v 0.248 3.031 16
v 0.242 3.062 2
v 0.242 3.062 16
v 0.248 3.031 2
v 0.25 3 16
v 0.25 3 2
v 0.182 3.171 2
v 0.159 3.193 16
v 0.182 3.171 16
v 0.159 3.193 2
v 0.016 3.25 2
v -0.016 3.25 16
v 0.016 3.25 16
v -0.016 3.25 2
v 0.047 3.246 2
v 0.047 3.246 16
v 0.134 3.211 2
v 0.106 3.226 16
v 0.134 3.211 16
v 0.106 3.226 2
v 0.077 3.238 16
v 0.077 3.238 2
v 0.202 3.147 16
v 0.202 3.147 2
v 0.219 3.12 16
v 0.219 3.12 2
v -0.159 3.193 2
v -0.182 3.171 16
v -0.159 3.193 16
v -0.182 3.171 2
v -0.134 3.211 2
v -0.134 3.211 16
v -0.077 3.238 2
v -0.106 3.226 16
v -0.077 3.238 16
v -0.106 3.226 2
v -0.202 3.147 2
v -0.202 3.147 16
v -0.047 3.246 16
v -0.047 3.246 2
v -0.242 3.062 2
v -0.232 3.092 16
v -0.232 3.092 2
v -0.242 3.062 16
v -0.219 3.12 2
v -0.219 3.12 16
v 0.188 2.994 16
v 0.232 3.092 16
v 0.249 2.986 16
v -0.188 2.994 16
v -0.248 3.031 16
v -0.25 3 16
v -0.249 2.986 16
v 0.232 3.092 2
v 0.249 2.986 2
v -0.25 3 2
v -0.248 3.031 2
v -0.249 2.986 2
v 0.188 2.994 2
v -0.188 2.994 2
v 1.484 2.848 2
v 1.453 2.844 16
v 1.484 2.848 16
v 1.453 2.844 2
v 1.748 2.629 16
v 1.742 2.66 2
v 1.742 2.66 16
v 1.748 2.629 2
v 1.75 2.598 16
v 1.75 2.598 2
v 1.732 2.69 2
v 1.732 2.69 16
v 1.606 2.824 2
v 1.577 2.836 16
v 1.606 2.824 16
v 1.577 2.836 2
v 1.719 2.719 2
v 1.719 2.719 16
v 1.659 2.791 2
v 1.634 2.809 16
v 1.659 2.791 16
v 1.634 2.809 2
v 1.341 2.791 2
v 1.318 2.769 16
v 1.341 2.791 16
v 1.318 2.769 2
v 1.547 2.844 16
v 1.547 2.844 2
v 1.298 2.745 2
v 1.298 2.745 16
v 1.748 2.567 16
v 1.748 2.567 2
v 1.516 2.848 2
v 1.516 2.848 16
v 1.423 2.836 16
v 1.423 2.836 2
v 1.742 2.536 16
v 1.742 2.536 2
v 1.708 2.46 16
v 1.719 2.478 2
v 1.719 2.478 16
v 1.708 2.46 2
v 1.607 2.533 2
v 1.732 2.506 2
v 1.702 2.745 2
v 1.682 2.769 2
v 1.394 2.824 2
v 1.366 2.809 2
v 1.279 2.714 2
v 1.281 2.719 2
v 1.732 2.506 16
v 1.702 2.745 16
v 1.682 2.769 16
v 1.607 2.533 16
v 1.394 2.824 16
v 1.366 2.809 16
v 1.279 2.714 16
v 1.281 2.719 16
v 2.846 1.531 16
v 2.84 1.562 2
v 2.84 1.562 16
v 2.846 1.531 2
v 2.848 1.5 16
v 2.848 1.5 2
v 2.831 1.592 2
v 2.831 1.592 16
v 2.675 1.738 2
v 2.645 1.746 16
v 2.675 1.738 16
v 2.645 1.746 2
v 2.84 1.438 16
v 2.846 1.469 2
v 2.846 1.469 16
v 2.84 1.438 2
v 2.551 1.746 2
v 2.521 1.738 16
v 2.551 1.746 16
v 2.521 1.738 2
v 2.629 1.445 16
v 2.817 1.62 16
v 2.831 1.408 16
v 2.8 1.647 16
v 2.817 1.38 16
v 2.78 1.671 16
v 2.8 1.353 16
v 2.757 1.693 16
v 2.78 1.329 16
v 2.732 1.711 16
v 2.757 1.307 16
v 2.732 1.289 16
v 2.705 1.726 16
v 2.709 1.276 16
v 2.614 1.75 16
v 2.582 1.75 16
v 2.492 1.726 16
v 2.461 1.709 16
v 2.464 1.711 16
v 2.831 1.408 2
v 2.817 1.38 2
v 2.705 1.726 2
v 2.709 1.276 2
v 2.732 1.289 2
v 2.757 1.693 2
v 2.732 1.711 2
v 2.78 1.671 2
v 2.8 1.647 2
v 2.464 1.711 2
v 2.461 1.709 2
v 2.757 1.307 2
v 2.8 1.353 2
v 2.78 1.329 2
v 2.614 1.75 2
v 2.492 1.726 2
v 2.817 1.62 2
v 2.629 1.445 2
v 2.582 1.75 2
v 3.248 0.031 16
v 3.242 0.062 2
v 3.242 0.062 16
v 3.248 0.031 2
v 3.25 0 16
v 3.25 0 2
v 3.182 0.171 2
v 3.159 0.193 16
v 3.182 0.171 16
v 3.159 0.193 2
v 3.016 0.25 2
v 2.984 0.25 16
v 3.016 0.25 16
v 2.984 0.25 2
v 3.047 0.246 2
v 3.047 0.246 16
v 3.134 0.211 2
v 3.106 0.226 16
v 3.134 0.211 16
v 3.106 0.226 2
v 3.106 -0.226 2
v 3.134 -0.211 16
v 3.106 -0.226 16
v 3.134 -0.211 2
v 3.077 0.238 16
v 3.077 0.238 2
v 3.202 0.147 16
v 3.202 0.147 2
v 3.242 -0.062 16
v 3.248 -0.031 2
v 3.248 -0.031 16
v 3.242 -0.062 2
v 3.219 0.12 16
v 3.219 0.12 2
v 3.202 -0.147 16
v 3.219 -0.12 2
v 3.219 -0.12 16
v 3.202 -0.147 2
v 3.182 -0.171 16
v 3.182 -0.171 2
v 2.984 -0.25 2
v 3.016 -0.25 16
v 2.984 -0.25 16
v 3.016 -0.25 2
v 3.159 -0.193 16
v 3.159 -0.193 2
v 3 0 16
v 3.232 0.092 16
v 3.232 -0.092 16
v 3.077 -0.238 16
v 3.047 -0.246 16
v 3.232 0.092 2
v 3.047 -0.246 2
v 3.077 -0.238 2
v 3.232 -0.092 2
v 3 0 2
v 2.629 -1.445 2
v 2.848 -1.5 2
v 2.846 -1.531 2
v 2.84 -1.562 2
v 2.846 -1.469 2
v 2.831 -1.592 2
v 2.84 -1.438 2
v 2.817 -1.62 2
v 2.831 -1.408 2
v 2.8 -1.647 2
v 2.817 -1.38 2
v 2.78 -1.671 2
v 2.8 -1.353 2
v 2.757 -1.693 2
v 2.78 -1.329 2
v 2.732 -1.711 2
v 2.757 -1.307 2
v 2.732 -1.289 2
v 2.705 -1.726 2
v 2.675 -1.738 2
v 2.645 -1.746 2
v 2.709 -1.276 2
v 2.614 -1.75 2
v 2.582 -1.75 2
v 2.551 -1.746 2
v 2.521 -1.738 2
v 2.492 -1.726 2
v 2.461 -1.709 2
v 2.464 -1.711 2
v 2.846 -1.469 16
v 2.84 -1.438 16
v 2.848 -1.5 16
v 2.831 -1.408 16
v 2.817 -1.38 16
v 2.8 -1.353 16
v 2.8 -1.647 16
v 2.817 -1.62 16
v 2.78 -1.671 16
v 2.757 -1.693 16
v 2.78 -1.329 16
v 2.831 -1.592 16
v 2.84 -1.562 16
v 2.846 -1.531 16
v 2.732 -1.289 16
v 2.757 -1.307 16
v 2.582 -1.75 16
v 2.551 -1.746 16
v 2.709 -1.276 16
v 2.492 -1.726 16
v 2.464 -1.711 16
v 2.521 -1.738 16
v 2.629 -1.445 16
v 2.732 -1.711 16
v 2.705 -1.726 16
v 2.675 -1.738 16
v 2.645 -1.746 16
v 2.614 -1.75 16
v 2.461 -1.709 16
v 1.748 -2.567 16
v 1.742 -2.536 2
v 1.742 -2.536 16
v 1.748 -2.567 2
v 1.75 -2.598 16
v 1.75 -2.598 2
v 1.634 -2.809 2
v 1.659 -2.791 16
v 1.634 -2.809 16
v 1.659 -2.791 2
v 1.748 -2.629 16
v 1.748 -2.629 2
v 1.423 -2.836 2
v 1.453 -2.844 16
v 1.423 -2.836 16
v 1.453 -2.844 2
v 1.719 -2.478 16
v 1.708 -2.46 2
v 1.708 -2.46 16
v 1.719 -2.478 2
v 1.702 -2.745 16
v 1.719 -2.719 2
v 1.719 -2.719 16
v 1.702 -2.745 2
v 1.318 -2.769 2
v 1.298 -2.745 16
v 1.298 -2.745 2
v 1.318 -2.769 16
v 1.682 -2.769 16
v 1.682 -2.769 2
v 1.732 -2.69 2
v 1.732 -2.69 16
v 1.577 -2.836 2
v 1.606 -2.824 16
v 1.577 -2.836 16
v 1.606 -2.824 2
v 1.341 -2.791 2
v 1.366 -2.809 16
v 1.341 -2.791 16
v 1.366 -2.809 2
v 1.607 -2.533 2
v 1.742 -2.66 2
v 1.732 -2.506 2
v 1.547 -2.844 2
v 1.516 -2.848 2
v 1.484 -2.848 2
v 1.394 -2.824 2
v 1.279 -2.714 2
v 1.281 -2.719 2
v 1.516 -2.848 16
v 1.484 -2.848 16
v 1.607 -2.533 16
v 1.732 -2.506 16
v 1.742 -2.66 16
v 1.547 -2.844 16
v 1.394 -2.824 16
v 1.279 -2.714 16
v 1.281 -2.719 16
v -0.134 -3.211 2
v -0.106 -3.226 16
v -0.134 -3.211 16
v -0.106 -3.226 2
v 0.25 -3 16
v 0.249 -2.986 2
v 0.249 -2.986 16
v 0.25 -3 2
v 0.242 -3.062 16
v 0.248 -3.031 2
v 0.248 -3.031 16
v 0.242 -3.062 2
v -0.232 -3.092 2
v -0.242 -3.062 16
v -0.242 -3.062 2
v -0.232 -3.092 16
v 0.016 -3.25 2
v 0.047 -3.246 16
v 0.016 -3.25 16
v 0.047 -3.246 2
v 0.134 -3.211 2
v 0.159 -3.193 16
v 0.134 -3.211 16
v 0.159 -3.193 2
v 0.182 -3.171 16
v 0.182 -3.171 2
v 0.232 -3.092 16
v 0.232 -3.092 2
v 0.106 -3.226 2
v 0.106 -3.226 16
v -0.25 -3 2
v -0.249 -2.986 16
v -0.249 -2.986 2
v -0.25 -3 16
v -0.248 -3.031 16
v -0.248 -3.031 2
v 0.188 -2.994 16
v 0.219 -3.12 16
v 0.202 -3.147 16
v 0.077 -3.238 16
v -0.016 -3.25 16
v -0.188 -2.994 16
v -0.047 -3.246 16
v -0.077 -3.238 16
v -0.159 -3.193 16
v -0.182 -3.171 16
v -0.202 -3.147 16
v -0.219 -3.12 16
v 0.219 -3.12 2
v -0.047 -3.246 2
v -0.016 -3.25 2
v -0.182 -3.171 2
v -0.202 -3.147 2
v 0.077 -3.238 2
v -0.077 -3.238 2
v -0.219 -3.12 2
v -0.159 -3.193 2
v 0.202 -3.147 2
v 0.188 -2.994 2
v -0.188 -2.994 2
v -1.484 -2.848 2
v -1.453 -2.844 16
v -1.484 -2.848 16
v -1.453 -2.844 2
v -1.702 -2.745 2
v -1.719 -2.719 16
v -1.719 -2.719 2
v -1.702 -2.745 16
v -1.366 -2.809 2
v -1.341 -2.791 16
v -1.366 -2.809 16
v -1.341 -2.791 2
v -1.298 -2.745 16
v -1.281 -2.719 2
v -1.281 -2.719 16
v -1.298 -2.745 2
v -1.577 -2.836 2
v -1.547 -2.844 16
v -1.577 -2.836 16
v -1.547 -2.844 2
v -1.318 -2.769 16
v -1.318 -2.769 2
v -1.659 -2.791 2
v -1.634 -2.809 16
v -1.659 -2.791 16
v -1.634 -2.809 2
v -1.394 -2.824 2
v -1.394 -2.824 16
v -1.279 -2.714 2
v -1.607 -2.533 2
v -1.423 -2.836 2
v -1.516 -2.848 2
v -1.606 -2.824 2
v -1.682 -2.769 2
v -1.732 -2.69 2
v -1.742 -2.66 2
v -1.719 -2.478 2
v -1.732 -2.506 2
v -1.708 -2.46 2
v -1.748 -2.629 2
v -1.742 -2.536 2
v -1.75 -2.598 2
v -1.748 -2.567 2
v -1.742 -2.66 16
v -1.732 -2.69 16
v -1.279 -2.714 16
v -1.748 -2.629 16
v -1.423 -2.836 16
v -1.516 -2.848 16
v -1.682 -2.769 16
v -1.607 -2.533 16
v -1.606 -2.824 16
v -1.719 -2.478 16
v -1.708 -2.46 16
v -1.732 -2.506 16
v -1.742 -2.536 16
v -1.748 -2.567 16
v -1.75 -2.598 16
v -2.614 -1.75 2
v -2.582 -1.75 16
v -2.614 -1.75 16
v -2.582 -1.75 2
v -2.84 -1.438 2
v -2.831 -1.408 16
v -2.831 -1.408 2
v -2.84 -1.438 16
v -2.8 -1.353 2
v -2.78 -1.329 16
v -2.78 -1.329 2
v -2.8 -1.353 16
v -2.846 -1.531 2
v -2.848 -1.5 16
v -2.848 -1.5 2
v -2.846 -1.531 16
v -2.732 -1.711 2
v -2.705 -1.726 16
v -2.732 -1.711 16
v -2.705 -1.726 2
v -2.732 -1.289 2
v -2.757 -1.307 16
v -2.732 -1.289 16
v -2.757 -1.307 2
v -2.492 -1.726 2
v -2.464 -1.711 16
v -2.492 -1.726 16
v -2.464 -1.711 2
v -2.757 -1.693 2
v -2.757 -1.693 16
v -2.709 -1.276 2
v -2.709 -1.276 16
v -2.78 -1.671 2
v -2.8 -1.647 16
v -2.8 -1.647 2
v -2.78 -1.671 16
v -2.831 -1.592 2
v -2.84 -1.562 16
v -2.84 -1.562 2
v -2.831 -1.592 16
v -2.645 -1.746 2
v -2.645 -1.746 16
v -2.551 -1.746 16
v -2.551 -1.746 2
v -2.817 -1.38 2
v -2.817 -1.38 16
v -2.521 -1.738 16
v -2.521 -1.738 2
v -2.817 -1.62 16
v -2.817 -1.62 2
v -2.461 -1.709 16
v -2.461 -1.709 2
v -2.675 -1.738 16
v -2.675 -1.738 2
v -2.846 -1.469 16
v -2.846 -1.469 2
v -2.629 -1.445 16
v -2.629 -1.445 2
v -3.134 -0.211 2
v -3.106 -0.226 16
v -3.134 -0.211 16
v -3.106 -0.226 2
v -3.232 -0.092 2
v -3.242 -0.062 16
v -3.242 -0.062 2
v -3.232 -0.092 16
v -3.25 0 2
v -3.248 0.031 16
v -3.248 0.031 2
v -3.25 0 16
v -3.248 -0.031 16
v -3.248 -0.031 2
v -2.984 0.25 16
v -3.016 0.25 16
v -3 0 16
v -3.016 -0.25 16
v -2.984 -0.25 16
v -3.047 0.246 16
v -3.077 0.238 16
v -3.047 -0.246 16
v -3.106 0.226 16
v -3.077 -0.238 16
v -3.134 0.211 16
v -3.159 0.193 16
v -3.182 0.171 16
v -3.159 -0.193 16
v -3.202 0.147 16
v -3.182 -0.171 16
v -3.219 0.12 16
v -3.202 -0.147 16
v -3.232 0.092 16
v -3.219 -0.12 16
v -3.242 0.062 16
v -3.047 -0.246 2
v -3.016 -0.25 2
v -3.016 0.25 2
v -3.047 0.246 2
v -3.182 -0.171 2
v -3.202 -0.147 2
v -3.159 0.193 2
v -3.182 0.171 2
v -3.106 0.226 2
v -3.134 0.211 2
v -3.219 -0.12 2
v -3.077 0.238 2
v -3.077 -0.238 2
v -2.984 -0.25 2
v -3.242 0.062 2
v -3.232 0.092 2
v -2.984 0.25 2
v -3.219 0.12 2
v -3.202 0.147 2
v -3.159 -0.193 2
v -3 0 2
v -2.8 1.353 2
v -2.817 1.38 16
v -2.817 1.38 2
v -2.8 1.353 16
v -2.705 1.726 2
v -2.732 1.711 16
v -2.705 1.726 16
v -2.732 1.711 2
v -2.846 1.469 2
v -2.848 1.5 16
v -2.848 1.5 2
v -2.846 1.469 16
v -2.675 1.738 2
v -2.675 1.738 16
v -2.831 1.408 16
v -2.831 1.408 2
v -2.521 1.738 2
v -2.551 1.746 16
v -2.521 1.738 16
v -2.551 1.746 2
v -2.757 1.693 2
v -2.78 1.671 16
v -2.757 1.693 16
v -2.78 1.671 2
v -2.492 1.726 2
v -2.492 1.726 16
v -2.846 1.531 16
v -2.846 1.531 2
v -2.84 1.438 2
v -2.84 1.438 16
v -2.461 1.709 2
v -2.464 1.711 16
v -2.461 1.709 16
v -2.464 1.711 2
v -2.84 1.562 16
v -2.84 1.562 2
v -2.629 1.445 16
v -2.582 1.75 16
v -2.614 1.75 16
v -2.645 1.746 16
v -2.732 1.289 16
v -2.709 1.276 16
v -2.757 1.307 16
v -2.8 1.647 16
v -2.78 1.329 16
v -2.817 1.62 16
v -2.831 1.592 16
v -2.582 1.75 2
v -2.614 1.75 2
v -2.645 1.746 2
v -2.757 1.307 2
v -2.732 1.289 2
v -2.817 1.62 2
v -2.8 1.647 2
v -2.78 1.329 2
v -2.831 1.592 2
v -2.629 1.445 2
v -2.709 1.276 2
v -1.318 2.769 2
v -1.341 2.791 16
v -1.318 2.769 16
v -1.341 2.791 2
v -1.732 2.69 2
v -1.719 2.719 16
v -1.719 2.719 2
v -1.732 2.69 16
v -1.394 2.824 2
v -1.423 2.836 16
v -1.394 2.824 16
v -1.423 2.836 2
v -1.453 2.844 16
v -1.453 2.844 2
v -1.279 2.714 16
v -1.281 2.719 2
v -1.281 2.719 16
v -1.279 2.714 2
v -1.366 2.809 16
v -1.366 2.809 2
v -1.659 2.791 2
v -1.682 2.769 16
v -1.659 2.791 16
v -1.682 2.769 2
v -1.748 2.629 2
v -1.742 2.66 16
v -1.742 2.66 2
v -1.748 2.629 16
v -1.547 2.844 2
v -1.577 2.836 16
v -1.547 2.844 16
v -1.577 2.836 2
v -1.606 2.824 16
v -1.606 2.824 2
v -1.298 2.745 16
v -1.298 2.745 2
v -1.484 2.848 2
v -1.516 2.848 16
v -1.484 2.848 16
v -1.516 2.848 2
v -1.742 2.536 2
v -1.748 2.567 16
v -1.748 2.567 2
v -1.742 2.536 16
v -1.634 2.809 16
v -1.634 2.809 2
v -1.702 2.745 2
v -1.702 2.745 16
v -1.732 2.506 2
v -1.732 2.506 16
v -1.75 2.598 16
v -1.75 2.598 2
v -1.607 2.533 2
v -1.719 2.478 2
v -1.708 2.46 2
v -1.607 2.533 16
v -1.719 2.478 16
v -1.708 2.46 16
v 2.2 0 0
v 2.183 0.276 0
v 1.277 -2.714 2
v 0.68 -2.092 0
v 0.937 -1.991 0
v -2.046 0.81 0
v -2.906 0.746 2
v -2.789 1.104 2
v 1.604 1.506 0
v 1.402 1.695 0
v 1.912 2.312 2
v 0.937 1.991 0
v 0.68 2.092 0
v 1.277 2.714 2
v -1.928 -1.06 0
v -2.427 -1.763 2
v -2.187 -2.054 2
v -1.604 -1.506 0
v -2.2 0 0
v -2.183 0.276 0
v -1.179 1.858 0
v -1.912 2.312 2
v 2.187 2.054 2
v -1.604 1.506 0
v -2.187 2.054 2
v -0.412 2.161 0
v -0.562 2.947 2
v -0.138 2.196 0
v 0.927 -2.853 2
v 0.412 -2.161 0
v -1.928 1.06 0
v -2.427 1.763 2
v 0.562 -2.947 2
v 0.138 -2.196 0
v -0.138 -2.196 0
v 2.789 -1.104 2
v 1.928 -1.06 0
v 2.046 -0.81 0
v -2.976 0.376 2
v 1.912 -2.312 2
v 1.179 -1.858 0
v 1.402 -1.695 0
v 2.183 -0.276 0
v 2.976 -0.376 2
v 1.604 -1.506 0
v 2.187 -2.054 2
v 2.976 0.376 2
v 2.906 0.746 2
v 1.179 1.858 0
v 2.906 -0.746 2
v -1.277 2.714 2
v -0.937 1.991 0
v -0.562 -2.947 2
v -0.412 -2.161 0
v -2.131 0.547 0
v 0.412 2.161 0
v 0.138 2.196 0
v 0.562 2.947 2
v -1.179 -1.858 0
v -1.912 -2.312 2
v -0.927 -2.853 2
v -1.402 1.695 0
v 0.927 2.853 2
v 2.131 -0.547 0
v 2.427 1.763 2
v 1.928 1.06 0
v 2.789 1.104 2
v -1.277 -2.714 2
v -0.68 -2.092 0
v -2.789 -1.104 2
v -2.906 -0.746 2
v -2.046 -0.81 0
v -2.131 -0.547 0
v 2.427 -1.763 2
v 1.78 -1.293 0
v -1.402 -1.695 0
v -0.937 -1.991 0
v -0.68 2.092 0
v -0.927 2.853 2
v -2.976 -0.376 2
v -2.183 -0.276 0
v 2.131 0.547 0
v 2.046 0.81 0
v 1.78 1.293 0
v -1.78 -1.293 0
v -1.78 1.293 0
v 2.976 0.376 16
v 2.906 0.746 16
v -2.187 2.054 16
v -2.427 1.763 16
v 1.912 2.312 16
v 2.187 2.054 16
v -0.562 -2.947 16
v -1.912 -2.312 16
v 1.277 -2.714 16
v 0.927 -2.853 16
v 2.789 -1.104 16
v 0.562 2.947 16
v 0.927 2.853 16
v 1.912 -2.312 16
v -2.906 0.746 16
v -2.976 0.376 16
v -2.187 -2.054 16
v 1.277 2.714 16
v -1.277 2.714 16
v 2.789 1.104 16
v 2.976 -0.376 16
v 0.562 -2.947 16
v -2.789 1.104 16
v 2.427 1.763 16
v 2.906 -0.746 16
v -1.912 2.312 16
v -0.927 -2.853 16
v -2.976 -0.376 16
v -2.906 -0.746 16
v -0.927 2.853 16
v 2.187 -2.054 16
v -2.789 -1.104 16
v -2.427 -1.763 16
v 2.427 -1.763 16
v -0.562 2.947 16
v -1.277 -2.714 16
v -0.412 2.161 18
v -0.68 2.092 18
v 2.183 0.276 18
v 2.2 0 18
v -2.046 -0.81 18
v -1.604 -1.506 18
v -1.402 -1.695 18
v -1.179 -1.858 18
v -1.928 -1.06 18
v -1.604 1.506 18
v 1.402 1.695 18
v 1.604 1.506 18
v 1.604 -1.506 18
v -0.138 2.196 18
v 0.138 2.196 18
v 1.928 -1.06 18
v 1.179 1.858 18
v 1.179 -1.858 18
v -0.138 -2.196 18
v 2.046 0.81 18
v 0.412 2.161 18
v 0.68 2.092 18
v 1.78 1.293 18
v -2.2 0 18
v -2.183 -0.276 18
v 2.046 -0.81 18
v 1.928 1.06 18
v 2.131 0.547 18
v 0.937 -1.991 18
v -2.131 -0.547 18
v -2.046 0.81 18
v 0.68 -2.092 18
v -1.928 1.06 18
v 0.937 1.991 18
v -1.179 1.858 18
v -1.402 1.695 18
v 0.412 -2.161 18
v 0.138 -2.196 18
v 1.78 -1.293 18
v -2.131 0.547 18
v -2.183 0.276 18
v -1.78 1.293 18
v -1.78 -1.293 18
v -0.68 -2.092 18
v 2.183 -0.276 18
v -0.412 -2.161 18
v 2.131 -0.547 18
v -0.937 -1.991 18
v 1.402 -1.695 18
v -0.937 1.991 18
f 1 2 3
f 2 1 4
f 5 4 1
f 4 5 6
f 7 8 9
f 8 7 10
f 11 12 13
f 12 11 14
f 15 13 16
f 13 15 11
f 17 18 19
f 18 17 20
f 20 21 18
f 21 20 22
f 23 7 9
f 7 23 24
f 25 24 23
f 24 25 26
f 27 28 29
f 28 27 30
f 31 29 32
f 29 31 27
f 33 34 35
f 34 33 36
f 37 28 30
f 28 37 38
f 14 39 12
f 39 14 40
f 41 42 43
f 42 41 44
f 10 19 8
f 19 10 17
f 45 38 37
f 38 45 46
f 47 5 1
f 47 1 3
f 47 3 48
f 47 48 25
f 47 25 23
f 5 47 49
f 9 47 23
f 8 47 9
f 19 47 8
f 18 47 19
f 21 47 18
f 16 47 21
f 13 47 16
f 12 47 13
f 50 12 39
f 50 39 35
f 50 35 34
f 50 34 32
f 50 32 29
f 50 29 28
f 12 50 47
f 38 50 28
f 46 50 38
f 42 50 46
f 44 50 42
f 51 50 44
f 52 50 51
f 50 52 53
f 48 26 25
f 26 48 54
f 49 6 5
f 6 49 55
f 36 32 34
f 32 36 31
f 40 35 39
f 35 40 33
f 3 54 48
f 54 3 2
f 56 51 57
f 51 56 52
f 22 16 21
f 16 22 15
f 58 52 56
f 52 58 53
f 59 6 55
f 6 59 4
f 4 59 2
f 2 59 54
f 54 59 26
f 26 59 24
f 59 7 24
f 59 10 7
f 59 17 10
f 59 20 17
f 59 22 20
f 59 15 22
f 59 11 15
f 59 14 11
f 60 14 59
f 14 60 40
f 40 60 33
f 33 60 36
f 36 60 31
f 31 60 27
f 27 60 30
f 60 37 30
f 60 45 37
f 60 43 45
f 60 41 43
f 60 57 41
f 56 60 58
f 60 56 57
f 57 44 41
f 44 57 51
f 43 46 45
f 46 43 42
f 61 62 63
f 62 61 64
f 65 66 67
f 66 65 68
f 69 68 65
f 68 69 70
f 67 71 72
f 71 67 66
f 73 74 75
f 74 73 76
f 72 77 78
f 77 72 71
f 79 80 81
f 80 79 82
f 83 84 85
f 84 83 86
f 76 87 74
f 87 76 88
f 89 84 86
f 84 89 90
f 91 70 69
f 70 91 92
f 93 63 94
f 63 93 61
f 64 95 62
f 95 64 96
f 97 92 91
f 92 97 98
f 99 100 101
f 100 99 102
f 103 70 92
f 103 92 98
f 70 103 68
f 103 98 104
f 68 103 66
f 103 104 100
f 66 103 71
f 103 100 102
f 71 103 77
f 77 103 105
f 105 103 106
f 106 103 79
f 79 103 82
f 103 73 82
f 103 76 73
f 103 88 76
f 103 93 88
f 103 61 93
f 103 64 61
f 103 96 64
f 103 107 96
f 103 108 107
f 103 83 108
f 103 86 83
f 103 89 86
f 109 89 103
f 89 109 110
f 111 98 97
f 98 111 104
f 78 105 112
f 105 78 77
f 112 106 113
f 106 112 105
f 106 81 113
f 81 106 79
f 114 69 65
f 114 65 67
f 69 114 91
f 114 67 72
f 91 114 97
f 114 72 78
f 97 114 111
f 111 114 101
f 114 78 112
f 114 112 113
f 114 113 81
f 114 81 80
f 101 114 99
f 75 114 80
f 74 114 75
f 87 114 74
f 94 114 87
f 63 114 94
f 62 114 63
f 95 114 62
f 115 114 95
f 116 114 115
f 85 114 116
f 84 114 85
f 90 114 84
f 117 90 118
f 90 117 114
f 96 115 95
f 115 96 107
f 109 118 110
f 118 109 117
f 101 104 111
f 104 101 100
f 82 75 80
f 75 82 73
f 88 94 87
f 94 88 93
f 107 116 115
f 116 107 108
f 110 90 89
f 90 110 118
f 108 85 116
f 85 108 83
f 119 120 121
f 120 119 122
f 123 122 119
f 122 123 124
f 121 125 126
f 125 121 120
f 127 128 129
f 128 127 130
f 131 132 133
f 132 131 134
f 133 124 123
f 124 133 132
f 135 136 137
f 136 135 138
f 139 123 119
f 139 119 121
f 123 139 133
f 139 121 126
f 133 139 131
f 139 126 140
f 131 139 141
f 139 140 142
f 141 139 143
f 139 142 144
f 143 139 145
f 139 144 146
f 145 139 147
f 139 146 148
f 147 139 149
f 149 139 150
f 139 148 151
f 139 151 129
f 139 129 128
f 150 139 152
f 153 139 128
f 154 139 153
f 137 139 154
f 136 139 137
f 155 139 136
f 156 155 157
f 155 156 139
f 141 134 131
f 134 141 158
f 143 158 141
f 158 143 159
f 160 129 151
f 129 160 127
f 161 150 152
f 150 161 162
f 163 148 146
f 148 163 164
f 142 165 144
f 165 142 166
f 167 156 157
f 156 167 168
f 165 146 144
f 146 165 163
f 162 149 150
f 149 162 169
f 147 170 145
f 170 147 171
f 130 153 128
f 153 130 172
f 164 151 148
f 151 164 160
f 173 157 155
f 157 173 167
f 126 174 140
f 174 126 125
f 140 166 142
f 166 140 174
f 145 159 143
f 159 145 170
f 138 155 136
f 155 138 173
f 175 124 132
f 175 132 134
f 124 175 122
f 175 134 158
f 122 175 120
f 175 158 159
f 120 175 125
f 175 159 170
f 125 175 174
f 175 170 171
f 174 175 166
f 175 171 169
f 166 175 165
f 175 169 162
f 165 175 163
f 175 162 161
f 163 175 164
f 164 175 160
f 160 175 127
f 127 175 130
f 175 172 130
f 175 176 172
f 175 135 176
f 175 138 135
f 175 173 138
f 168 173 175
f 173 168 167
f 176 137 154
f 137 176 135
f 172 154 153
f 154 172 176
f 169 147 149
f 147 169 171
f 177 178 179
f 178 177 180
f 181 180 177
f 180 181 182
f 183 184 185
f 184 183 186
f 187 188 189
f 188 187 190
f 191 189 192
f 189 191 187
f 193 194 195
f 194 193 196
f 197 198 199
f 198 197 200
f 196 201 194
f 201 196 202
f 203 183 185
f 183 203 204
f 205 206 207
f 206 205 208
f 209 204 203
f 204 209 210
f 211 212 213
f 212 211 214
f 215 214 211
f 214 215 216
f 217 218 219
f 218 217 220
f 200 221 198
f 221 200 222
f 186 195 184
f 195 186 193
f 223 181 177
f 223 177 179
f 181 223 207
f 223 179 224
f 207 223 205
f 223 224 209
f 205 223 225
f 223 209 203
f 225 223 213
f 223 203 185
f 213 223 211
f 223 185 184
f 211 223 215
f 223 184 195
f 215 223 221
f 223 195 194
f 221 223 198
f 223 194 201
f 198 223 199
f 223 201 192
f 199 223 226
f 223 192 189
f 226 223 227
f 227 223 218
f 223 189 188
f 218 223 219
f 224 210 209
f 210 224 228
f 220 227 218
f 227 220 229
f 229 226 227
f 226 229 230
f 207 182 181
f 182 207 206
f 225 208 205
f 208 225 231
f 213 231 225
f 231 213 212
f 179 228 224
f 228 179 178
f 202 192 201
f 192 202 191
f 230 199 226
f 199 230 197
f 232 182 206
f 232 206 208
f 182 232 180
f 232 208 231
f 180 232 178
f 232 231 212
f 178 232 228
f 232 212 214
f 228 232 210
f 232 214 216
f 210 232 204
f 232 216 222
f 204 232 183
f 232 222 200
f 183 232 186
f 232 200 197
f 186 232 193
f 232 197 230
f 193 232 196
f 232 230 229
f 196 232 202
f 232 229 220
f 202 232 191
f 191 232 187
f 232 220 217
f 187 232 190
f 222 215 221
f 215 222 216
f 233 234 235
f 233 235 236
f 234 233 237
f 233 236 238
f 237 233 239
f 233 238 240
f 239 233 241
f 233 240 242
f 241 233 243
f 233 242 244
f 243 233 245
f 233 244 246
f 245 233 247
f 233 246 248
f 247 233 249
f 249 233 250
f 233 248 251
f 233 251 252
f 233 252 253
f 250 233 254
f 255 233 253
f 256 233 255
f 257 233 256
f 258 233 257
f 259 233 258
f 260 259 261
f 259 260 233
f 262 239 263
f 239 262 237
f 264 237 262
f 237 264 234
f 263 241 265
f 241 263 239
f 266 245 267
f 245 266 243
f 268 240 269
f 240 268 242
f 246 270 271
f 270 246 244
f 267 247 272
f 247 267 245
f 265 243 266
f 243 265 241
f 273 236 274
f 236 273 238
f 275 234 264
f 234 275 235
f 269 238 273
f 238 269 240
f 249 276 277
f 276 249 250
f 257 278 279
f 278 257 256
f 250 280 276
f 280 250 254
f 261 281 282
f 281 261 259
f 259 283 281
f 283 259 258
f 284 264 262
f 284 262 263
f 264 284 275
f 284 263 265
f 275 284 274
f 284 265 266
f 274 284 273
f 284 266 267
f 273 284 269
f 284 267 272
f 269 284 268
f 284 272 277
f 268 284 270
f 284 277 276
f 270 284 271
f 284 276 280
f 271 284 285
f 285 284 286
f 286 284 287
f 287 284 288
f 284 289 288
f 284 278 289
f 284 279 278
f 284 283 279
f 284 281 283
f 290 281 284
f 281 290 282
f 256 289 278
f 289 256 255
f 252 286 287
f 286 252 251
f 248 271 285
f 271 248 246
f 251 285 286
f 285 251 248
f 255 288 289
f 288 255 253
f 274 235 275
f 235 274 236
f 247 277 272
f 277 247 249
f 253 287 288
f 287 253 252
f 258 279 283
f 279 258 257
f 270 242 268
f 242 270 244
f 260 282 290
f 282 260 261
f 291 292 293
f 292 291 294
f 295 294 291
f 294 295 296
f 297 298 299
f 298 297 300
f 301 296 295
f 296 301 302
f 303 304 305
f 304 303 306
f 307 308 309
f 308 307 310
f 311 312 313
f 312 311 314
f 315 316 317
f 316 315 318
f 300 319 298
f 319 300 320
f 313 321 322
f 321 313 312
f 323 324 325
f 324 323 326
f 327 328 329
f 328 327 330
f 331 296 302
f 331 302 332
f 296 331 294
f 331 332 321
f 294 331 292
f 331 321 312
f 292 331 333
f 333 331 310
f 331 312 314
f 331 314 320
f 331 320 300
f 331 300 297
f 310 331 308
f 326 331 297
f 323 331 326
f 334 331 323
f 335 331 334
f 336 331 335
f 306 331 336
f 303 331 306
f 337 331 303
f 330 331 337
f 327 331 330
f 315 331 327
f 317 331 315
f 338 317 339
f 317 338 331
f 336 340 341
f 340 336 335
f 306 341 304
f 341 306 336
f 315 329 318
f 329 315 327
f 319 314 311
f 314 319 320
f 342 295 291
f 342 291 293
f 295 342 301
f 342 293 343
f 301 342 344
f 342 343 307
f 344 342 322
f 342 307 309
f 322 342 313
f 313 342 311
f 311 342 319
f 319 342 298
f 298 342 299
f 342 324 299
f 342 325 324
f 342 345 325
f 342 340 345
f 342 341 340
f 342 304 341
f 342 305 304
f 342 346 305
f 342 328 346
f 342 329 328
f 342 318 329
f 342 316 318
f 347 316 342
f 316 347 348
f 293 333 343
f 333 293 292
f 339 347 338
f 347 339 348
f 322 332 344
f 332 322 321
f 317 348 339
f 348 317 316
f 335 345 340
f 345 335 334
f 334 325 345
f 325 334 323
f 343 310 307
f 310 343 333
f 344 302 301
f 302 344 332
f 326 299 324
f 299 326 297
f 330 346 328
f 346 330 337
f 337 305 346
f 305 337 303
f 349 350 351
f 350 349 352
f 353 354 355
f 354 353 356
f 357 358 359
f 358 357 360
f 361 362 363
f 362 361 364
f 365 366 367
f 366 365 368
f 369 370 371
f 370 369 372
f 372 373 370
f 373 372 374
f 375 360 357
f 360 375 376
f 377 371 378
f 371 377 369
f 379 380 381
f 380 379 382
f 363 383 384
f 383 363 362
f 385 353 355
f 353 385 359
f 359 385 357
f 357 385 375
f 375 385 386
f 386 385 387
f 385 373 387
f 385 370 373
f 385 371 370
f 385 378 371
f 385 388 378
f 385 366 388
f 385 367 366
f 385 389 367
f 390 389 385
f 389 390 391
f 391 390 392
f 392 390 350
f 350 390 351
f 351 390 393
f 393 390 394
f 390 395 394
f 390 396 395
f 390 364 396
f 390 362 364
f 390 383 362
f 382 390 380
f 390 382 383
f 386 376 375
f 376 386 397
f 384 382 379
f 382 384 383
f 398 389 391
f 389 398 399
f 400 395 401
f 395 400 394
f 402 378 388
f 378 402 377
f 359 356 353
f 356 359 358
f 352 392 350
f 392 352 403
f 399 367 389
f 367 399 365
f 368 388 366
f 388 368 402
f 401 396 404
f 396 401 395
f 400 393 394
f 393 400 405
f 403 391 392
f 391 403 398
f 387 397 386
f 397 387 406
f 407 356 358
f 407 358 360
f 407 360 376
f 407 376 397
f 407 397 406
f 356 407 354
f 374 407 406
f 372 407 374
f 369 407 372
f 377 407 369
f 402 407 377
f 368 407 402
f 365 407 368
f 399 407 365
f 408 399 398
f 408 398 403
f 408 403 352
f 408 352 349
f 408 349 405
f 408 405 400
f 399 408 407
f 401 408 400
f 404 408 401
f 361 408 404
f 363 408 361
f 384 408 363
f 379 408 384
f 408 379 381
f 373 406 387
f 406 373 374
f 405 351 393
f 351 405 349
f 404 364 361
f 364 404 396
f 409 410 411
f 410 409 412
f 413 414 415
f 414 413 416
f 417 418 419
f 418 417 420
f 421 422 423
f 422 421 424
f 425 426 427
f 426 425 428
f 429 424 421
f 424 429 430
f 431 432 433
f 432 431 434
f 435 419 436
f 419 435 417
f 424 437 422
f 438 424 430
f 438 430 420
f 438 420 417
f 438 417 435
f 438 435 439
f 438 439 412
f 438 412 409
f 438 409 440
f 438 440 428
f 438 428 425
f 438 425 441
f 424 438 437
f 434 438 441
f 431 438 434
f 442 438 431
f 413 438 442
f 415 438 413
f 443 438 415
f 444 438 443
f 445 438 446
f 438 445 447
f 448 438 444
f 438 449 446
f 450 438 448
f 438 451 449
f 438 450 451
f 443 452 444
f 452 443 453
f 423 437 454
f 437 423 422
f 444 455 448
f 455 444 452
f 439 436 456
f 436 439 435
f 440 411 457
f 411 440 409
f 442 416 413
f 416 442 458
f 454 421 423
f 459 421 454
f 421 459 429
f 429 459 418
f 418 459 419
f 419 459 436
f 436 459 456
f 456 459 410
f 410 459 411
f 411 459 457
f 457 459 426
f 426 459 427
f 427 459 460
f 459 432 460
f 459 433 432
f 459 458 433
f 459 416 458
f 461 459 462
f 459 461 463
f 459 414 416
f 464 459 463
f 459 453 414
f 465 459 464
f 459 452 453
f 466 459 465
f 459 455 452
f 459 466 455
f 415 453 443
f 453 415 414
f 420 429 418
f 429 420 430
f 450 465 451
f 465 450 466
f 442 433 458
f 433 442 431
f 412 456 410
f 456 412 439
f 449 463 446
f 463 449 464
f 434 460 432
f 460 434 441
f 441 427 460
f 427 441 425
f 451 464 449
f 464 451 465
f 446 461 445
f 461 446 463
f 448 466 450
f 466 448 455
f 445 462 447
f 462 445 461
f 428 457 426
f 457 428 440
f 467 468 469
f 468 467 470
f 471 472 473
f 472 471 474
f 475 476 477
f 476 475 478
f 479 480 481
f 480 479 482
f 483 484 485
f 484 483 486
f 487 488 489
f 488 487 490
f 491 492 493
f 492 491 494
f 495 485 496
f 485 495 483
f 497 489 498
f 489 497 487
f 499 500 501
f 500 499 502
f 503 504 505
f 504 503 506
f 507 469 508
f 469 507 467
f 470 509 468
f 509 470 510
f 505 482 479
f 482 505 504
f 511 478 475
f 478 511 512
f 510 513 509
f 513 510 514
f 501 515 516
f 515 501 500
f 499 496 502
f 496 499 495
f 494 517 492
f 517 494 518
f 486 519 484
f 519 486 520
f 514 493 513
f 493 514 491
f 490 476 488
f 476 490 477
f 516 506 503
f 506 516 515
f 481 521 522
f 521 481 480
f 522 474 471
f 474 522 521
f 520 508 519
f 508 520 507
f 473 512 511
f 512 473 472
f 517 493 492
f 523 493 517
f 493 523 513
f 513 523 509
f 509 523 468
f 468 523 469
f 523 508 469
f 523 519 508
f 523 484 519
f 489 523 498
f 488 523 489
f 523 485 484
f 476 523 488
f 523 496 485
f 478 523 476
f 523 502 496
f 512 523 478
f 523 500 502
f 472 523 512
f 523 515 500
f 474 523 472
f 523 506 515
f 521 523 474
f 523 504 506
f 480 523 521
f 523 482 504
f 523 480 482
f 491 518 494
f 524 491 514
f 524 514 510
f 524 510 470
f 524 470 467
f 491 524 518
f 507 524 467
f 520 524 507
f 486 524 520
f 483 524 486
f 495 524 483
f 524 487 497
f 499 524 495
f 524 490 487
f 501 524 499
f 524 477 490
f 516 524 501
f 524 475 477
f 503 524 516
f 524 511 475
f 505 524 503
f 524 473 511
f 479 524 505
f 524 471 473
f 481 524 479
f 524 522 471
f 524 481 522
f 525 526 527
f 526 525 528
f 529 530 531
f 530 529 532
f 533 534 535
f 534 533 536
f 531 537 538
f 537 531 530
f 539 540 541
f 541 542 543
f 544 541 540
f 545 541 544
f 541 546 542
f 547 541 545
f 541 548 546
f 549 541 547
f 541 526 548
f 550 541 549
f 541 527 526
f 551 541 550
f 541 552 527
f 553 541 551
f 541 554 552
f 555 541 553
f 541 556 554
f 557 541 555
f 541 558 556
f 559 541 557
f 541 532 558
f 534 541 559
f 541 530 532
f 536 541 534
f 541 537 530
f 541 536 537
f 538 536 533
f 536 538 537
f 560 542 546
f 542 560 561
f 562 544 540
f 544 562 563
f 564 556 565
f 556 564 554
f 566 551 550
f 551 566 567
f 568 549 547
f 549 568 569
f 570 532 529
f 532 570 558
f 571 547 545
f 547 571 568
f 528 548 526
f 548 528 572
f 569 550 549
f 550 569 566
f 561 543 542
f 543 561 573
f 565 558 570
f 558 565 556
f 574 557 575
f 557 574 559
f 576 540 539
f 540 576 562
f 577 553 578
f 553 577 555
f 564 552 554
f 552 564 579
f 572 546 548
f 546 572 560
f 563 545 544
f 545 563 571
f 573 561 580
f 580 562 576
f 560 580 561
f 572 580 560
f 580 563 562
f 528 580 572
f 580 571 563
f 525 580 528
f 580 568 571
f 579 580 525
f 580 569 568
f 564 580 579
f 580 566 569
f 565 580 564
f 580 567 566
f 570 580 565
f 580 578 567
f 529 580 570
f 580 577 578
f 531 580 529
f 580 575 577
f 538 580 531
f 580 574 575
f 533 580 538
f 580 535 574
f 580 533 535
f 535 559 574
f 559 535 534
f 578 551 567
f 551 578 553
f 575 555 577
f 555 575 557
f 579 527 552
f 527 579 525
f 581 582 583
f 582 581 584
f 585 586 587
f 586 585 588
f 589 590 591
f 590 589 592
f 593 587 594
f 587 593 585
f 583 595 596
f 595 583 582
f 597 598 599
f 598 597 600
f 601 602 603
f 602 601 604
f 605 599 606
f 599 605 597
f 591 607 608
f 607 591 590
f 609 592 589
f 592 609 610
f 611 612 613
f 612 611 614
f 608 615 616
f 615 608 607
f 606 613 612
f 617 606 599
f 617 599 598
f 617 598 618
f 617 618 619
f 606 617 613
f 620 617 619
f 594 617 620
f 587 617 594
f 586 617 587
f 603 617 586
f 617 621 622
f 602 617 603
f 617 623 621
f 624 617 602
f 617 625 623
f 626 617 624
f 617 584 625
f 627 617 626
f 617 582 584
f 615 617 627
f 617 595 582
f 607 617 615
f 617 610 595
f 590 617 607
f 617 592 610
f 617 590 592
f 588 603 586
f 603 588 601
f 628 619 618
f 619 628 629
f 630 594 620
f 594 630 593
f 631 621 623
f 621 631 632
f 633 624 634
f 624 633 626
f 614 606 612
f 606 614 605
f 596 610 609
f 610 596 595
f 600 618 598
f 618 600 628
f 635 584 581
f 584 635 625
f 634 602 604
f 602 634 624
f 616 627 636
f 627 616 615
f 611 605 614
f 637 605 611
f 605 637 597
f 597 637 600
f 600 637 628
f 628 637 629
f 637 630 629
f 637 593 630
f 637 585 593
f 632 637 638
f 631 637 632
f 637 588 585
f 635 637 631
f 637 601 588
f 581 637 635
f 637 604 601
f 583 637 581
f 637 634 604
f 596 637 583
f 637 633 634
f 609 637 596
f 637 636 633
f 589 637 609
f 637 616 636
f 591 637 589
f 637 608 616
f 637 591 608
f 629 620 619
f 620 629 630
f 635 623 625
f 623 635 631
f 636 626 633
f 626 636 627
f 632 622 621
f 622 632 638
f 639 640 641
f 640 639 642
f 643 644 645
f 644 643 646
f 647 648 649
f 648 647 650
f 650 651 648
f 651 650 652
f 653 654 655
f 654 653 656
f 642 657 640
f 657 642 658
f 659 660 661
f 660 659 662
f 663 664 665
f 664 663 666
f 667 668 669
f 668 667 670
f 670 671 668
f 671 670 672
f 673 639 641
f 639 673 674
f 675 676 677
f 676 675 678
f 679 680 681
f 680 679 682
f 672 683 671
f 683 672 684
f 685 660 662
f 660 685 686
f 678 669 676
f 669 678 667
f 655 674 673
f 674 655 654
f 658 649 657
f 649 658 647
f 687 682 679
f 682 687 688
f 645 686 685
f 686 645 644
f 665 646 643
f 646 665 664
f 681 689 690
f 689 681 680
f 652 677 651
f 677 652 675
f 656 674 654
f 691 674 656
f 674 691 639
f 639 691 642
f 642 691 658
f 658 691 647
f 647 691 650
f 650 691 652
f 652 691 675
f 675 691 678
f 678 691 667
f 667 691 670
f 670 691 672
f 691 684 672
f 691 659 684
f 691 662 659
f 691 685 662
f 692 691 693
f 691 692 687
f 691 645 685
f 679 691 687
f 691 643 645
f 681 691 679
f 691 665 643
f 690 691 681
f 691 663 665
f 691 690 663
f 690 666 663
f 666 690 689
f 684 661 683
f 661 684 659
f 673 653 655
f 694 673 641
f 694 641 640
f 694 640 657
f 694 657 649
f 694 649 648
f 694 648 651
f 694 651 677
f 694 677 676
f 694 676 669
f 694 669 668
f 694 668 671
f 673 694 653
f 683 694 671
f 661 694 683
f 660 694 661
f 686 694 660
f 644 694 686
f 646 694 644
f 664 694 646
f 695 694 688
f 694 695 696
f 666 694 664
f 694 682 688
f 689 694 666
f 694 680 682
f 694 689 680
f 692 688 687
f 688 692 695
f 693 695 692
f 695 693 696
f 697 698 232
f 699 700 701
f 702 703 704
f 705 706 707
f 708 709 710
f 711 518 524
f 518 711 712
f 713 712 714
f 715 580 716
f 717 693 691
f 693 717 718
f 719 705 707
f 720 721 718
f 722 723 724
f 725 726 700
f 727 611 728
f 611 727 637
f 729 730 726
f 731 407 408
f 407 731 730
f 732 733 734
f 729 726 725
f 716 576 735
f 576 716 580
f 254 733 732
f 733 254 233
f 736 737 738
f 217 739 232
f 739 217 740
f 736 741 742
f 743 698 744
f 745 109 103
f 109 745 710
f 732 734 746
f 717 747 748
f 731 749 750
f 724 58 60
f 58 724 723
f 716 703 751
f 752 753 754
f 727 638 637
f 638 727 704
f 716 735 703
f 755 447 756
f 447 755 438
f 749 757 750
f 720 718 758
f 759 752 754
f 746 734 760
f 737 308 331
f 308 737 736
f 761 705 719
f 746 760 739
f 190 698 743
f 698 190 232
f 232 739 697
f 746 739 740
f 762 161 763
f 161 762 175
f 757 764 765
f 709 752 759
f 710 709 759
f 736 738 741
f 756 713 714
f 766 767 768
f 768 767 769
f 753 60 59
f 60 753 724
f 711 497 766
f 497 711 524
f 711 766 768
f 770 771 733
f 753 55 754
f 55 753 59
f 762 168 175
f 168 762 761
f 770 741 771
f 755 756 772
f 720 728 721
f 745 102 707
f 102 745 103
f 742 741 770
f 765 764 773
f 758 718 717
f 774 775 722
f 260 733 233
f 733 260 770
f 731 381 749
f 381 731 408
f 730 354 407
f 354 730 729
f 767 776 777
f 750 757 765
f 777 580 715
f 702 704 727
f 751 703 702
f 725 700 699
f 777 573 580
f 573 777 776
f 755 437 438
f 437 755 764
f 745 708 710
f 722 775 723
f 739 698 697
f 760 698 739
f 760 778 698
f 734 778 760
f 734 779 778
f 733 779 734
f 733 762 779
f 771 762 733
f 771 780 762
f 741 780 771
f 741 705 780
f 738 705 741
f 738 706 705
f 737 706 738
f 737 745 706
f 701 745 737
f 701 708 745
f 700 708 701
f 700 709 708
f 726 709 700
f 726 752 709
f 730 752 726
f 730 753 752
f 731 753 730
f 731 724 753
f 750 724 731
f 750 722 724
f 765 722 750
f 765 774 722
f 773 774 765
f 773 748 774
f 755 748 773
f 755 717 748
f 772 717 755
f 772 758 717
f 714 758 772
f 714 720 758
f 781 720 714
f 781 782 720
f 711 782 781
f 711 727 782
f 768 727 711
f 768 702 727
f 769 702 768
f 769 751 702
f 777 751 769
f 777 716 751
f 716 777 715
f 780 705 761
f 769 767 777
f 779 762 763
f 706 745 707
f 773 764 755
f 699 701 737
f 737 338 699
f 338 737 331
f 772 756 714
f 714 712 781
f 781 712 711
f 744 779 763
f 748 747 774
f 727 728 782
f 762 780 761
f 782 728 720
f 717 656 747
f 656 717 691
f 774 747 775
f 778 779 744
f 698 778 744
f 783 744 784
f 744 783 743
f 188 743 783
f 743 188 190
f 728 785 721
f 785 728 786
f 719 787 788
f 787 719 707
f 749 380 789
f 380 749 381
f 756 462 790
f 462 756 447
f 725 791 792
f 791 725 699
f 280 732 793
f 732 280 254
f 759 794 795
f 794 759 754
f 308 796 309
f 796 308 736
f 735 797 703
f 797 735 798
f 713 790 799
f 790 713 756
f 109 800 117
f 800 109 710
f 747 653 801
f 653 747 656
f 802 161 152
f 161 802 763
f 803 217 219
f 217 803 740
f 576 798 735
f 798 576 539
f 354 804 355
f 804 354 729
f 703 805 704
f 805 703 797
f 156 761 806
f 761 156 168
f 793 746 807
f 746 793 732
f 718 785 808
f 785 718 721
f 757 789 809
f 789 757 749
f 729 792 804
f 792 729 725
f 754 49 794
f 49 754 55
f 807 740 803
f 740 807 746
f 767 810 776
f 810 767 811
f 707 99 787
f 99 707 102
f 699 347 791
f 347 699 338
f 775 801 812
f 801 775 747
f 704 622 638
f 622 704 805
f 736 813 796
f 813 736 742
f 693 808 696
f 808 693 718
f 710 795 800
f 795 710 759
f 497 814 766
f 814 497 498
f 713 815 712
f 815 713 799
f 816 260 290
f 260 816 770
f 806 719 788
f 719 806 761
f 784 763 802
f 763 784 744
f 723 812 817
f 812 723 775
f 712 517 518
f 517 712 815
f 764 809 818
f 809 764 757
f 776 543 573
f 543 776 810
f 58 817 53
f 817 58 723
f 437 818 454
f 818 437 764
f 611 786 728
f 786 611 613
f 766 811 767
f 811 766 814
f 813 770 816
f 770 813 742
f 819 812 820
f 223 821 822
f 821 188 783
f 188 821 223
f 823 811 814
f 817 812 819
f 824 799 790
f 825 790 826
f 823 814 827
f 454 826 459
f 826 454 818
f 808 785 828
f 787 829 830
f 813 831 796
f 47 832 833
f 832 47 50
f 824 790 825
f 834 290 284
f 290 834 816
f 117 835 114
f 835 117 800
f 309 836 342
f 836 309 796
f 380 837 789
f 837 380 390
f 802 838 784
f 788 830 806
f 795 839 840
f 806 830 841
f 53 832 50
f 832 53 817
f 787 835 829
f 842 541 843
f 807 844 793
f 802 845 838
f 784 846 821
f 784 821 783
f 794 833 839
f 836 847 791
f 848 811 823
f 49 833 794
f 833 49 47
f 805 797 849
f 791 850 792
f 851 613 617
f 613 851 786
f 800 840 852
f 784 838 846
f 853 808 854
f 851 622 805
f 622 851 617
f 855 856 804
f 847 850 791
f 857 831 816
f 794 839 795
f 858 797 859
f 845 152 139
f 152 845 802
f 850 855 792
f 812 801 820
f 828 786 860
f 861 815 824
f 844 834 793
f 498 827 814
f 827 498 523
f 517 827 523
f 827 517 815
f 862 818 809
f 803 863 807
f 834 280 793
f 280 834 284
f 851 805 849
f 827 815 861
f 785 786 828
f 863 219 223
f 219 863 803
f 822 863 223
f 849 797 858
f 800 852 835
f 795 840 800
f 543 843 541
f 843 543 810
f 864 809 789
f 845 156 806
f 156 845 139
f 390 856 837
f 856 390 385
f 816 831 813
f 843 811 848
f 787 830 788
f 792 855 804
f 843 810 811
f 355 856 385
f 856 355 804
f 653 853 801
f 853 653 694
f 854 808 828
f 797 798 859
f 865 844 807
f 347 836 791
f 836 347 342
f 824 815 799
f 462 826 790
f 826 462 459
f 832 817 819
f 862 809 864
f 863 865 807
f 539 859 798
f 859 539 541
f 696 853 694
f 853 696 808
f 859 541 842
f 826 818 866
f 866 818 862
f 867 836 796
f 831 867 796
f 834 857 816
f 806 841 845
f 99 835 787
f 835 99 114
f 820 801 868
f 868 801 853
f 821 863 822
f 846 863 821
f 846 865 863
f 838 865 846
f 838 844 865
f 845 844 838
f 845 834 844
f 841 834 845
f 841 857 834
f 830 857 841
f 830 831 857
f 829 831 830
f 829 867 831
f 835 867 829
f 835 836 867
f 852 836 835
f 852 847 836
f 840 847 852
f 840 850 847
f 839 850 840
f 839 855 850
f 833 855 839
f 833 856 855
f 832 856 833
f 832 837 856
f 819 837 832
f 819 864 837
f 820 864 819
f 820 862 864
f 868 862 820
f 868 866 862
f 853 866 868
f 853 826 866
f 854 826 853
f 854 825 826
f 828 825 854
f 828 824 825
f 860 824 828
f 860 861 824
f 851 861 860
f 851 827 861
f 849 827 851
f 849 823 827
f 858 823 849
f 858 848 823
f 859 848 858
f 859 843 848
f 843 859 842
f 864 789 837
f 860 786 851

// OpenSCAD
/*
    This mimics a wooden dowel pin used for joinery. The advantage is you can control 
    the dimensions. The disadvantage is that the wood glue won't penetrate the 
    plastic as it would with wood.
    
    Author: Alex Kazim
*/

/* [Main] */
// overall length including the caps
pin_length = 18;

// diameter excluding the ribs
pin_diameter = 6; 

// height of each end-cap
cap_h = 2;          // [0:5]


/* [Misc] */
// number of ribs around the core
num_ribs = 12;          // [0:30]

// radius of each rib
rib_radius = 0.25;

// rendering quality
$fn = 50;

/* [Hidden] */

// calcs
cap_r1 = pin_diameter/2 - 0.8;  // 20% drop in diameter for the end-cap
cap_r2 = pin_diameter/2;

dowel_l = pin_length - 2*cap_h;

union() {
    // cap
    cylinder(cap_h,cap_r1,cap_r2,center=false);
    
    // body
    translate([0,0,cap_h]) {
        cylinder(dowel_l,r=pin_diameter/2);
    }
    
    // cap
    translate([0,0,pin_length - cap_h]) {
        cylinder(cap_h,cap_r2,cap_r1,center=false);
    }
    
    // ribs
    if (num_ribs > 0) {
        for (i = [0:num_ribs - 1]) {
            translate([sin(360*i/num_ribs)*(pin_diameter/2), cos(360*i/num_ribs)*(pin_diameter/2),cap_h]) {
                color([1,0,0]) cylinder(h=dowel_l,r=rib_radius);
            }
        }
    }
}
